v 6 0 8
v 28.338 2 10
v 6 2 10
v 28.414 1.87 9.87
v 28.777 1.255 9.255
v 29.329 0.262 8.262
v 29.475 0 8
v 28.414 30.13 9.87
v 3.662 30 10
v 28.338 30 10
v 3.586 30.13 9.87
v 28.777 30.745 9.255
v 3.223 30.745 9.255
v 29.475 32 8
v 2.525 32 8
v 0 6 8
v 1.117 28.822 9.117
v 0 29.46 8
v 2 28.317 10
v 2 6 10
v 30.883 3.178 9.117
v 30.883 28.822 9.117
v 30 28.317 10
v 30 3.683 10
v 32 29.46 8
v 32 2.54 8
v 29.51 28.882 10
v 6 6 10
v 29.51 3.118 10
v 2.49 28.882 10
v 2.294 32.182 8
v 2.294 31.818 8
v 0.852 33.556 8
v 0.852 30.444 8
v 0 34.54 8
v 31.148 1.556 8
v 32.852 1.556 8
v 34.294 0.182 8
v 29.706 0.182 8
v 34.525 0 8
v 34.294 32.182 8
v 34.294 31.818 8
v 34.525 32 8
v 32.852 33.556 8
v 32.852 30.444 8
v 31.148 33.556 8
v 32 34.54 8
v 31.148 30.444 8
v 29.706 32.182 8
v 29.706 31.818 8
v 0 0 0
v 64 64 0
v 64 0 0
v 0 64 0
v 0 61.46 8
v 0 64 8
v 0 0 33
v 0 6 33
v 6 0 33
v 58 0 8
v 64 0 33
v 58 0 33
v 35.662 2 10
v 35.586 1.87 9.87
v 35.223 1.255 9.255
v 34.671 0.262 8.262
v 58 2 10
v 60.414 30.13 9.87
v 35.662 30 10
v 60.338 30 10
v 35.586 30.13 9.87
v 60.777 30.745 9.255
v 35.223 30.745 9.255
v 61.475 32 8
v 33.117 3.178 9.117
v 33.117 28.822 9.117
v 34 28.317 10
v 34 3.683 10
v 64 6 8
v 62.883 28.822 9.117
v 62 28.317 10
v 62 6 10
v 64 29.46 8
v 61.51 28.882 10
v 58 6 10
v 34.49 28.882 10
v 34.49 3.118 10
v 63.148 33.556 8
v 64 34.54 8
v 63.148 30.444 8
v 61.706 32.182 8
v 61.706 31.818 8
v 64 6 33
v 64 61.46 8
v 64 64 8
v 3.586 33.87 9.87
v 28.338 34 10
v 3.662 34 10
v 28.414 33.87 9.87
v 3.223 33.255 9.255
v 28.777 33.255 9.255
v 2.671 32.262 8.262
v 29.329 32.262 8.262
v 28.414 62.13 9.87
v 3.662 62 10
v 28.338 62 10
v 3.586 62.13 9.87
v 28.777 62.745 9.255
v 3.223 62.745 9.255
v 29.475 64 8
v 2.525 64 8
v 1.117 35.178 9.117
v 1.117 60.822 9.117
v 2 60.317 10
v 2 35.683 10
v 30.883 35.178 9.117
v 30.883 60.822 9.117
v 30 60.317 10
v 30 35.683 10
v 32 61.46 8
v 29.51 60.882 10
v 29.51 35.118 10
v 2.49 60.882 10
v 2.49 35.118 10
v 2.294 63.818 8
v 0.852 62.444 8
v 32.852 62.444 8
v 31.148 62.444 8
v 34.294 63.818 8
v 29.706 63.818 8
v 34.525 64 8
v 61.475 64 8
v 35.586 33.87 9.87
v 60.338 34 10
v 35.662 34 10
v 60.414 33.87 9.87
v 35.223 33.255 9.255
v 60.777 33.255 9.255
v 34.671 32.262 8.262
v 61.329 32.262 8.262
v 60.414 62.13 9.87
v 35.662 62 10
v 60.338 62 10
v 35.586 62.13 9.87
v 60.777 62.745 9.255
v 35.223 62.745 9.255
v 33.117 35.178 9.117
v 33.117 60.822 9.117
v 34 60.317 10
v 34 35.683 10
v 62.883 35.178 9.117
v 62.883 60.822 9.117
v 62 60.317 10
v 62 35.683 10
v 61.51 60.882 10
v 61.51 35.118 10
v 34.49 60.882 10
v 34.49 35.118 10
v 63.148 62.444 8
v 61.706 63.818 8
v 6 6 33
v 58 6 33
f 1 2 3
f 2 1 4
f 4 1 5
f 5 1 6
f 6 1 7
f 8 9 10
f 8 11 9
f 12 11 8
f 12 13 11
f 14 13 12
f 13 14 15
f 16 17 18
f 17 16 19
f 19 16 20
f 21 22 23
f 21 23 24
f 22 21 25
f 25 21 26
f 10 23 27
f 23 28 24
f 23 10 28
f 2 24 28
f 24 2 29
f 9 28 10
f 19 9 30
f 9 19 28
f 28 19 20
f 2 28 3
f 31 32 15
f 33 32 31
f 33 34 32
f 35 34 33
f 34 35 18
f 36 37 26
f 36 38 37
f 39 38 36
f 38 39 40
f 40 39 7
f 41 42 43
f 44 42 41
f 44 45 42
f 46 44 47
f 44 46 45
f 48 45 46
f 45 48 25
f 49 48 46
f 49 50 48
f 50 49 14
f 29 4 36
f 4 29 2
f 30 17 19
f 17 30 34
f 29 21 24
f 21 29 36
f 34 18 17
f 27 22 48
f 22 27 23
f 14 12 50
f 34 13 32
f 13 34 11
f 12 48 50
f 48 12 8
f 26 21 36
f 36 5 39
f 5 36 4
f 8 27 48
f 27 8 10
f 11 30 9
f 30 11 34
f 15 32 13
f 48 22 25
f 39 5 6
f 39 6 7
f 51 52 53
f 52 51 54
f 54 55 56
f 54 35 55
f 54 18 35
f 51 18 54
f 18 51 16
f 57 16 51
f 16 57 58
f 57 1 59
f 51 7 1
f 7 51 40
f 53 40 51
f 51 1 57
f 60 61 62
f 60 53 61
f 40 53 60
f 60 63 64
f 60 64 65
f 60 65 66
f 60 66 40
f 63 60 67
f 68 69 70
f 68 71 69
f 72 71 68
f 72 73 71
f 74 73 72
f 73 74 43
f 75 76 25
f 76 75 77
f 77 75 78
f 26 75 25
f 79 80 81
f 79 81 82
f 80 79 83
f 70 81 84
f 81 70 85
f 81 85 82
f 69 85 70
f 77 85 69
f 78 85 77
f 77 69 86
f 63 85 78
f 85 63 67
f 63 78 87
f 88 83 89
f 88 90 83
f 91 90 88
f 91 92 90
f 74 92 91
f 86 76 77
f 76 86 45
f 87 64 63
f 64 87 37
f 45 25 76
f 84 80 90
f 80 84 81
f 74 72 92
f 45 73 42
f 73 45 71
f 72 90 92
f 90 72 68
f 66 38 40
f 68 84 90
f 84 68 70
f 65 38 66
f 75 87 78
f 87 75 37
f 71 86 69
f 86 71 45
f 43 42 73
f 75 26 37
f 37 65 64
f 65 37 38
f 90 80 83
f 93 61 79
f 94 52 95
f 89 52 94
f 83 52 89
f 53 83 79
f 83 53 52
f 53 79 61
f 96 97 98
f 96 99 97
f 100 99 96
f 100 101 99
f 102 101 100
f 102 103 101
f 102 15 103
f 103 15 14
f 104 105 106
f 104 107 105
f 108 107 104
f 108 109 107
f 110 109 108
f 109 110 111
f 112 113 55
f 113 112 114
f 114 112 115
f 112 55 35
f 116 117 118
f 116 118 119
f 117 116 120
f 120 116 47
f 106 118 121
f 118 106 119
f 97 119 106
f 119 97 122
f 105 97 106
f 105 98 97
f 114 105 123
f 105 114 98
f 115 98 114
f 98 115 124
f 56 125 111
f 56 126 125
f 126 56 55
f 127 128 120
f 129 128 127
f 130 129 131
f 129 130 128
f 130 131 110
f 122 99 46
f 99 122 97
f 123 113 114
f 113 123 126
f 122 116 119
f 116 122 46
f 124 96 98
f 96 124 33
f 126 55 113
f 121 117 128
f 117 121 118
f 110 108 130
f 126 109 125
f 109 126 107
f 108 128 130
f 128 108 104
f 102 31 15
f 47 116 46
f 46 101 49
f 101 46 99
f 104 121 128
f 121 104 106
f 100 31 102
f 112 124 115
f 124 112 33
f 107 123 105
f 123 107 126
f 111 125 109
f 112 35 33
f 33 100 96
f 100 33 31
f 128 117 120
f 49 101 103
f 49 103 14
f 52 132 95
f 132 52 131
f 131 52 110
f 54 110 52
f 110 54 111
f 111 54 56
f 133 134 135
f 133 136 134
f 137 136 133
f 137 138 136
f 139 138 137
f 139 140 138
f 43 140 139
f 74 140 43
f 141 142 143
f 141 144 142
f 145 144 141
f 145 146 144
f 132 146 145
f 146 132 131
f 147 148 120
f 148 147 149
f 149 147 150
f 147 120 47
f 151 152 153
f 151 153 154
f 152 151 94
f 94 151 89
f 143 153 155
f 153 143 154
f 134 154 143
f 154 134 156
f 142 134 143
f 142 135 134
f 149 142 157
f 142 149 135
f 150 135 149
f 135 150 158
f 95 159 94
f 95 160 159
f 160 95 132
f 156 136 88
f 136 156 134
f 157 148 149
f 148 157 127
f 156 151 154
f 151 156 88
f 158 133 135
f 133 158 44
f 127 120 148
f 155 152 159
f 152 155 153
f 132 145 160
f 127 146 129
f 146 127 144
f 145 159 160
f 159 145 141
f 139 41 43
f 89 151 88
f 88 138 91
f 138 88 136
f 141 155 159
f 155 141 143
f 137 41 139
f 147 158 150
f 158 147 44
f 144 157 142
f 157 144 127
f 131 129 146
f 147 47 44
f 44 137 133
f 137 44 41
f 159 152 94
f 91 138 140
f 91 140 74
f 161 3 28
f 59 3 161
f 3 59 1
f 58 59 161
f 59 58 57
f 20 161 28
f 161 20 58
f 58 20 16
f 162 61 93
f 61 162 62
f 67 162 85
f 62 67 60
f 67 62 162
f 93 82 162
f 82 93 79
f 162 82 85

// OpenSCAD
// file: ModularDungeonTileLibrary.scad
//Constants
wallleft = 0;
wallbottom = 1;
wallright = 2;
walltop = 3;
wallcenter = 4;
walldoubleright = 5;


//Variables
size = 32;
connectorlength = size-10;
connectorwidth = 6;
connectorheight = 4;
baseheight = 8;
topperheight = 2;
topperrounded = true;
walllength = size;
wallheight = 25;
wallwidth = 6;
wallwidththin = 4;


//Functions
function hypotenuse_ra(side_a, side_b) =
    sqrt(pow(side_a, 2) + pow(side_b, 2));
    
    
//Modules    
module mtdl_Base_Connector(cw,cl,ch) {
    translate([-connectorwidth/2,-connectorlength/2,-connectorheight/2]) {
        cube([cw,cl,ch/2]);
        translate([cw/3,0,ch/2])
            cube([cw/3,cl,ch/2]);
        translate([-(cw-2)/2,cl/2-2,0])
            cube([cw+4,4,ch]);
    }
}

module mdtl_Base(s,bh)
{
    cube([s,s,bh]);
}

module mdtl_Topper(s,bh,th,tr)
{
    if (tr) {
        translate([0,0,bh])
            intersection() {
                difference () {
                        cube([s,s,th]);
                        union () {
                        rotate(a=45, v=[1,0,0])
                            cube([s,th*2,th*2]);
                        translate([0,s,0])
                            rotate(a=45, v=[1,0,0])
                                cube([s,th*2,th*2]);
                        rotate(a=-45, v=[0,1,0])
                            cube([th*2,s,th*2]);
                        translate([s,0,0])
                            rotate(a=-45, v=[0,1,0])
                                cube([th*2,s,th*2]);
                        }
                }
                translate([s/2,s/2,0])
                    cylinder(
                        h=th, 
                        r1=hypotenuse_ra(s/2-1.2, s/2-1.2), 
                        r2=hypotenuse_ra(s/2-th-.8, s/2-th-.8), 
                        center=false, 
                        $fa=.1);
            }    
    }
    else {
        translate([0,0,bh])
            difference() {
                cube([s,s,th]);
                union () {
                rotate(a=45, v=[1,0,0])
                    cube([s,th*2,th*2]);
                translate([0,s,0])
                    rotate(a=45, v=[1,0,0])
                        cube([s,th*2,th*2]);
                rotate(a=-45, v=[0,1,0])
                    cube([th*2,s,th*2]);
                translate([s,0,0])
                    rotate(a=-45, v=[0,1,0])
                        cube([th*2,s,th*2]);
                }
            }    
    }
}

module mdtl_Base_1x1(s,bh,th,tr) 
{
    difference () {
        union () {
            mdtl_Base(s,bh);
            mdtl_Topper(s,bh,th,tr);
        }
//        union () {
//            translate([size/2,size,baseheight/2])
//                rotate([0,180,0])
//                    mtdl_Base_Connector(connectorwidth,connectorlength,connectorheight);
//            translate([size/2,0,baseheight/2])
//                rotate([0,180,0])
//                    mtdl_Base_Connector(connectorwidth,connectorlength,connectorheight);
//            translate([size,size/2,baseheight/2])
//                rotate([0,180,90])
//                    mtdl_Base_Connector(connectorwidth,connectorlength,connectorheight);
//            translate([0,size/2,baseheight/2])
//                rotate([0,180,90])
//                    mtdl_Base_Connector(connectorwidth,connectorlength,connectorheight);
//        }
    }
}

module mdtl_Base_1x2(s,bh,th,tr)
{
    union () {
        mdtl_Base_1x1(s,bh,th,tr);
        translate([s,0,0])
            mdtl_Base_1x1(s,bh,th,tr);
    }
}
 
module mdtl_Base_2x2(s,bh,th,tr)
{
    union () {
        mdtl_Base_1x2(s,bh,th,tr);
        translate([0,s,0])
            mdtl_Base_1x2(s,bh,th,tr);
    }
}
 
module mdtl_Base_2x4(s,bh,th,tr)
{
    union () {
        mdtl_Base_2x2(s,bh,th,tr);
        translate([s*2,0,0])
            mdtl_Base_2x2(s,bh,th,tr);
    }
}
 
module mdtl_Base_4x4(s,bh,th,tr)
{
    union () {
        mdtl_Base_2x4(s,bh,th,tr);
        translate([0,s*2,0])
            mdtl_Base_2x4(s,bh,th,tr);
    }
}
 
module mdtl_Wall_1(w,l,h)
{
    translate([0,0,baseheight])
        cube([w,l,h]);   
}

module mdtl_Wall_1_Position(w,l,h,p)
{
    if (p==0) {
        mdtl_Wall_1(w,l,h);
    }
    
    else if (p==1) {
        rotate(a=-90)
           translate([-w,0,0])
               mdtl_Wall_1(w,l,h);       
    }
    
    else if (p==2) {
        translate([(size)-w,0,0])
            mdtl_Wall_1(w,l,h);
    }
    
    else if (p==3) {
        rotate(a=-90)
            translate([-l,0,0])
                mdtl_Wall_1(w,l,h);
    }
    
    else if (p==4) {
        translate([(size)-w/2,0,0])
            mdtl_Wall_1(w,l,h);
    }
    
    else if (p==5) {
        translate([(size*2)-w,0,0])
           mdtl_Wall_1(w,l,h);       
    }
}

module mdtl_Wall_2(w,l,h)
{
    union() {
        mdtl_Wall_1(w,l,h);
        translate([0,l,0])
            mdtl_Wall_1(w,l,h);
    }
}

module mdtl_Wall_2_Position(w,l,h,p)
{
    if (p==0) {
        mdtl_Wall_2(w,l,h);
    }
    
    else if (p==1) {
        rotate(a=-90)
            translate([-w,0,0])
                mdtl_Wall_2(w,l,h);
    }
    
    else if (p==2) {
    translate([(size*2)-w,0,0])
        mdtl_Wall_2(w,l,h);
    }
    
    else if (p==3) {
        rotate(a=-90)
            translate([-l*2,0,0])
                mdtl_Wall_2(w,l,h);
    }
    
    else if (p==4) {
        translate([(size)-w/2,0,0])
            mdtl_Wall_2(w,l,h);
    }
}
// main file
include <ModularDungeonTileLibrary.scad>; 

mdtl_Base_2x2(size,baseheight,topperheight,topperrounded);
//Create Pillar with modified wall
mdtl_Wall_2_Position(wallwidth,wallwidth/2,wallheight,wallleft);
mdtl_Wall_2_Position(wallwidth,wallwidth/2,wallheight,wallright);
